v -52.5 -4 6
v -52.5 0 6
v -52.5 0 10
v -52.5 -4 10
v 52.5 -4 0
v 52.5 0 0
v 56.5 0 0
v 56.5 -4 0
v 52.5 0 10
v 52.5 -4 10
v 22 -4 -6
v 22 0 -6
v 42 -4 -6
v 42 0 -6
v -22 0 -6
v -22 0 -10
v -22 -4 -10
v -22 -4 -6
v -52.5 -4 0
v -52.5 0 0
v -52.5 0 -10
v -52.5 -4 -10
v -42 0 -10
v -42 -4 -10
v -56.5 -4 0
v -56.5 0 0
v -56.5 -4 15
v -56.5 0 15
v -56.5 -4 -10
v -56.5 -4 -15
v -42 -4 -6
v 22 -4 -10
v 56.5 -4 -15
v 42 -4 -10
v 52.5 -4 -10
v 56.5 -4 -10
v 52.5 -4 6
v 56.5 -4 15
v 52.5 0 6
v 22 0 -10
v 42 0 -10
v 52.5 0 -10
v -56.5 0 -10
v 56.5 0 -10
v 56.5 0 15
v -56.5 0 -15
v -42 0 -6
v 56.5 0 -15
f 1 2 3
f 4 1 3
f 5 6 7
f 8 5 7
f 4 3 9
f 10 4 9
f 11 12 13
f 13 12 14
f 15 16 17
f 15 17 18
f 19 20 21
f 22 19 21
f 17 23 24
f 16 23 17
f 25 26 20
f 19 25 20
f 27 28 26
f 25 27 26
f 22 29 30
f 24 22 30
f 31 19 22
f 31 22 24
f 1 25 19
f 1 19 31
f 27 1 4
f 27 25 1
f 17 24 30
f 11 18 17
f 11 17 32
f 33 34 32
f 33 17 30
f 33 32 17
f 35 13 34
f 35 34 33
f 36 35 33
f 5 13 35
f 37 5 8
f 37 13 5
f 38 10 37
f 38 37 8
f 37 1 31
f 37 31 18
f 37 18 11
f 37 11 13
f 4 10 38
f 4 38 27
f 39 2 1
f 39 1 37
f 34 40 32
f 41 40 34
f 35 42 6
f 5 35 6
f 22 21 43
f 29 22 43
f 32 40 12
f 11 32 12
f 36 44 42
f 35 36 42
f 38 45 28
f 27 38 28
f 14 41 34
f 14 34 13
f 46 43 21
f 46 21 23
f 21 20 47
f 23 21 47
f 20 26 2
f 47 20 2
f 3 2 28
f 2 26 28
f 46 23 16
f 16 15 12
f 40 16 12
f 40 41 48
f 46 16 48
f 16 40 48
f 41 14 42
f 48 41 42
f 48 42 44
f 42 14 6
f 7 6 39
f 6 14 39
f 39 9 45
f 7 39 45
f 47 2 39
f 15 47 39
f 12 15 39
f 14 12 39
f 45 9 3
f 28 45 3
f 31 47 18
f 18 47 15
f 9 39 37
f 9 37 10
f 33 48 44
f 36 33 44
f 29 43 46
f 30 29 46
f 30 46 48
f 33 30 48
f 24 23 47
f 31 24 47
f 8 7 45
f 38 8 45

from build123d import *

# Parameters (mm, degrees)
F0_W     = 20
F0_H     = 4
F0_W_2   = 105
F1_DEPTH = 4


with BuildPart() as f1:
    # F0 (on Front) → F1 (new body)
    with BuildSketch(Plane.XZ):
        Polygon((56.5, 0), (56.5, 15), (-56.5, 15), (-56.5, 0), (-52.5, 0), (-52.5, -10), (-56.5, -10), (-56.5, -15), (56.5, -15), (56.5, -10), (52.5, -10), (52.5, 0), align=None)
        with Locations((-32, -8)):
            Rectangle(F0_W, F0_H, mode=Mode.SUBTRACT)
        with Locations((32, -8)):
            Rectangle(F0_W, F0_H, mode=Mode.SUBTRACT)
        with Locations((0, 8)):
            Rectangle(F0_W_2, F0_H, mode=Mode.SUBTRACT)
    extrude(amount=F1_DEPTH)


solid = f1.part
